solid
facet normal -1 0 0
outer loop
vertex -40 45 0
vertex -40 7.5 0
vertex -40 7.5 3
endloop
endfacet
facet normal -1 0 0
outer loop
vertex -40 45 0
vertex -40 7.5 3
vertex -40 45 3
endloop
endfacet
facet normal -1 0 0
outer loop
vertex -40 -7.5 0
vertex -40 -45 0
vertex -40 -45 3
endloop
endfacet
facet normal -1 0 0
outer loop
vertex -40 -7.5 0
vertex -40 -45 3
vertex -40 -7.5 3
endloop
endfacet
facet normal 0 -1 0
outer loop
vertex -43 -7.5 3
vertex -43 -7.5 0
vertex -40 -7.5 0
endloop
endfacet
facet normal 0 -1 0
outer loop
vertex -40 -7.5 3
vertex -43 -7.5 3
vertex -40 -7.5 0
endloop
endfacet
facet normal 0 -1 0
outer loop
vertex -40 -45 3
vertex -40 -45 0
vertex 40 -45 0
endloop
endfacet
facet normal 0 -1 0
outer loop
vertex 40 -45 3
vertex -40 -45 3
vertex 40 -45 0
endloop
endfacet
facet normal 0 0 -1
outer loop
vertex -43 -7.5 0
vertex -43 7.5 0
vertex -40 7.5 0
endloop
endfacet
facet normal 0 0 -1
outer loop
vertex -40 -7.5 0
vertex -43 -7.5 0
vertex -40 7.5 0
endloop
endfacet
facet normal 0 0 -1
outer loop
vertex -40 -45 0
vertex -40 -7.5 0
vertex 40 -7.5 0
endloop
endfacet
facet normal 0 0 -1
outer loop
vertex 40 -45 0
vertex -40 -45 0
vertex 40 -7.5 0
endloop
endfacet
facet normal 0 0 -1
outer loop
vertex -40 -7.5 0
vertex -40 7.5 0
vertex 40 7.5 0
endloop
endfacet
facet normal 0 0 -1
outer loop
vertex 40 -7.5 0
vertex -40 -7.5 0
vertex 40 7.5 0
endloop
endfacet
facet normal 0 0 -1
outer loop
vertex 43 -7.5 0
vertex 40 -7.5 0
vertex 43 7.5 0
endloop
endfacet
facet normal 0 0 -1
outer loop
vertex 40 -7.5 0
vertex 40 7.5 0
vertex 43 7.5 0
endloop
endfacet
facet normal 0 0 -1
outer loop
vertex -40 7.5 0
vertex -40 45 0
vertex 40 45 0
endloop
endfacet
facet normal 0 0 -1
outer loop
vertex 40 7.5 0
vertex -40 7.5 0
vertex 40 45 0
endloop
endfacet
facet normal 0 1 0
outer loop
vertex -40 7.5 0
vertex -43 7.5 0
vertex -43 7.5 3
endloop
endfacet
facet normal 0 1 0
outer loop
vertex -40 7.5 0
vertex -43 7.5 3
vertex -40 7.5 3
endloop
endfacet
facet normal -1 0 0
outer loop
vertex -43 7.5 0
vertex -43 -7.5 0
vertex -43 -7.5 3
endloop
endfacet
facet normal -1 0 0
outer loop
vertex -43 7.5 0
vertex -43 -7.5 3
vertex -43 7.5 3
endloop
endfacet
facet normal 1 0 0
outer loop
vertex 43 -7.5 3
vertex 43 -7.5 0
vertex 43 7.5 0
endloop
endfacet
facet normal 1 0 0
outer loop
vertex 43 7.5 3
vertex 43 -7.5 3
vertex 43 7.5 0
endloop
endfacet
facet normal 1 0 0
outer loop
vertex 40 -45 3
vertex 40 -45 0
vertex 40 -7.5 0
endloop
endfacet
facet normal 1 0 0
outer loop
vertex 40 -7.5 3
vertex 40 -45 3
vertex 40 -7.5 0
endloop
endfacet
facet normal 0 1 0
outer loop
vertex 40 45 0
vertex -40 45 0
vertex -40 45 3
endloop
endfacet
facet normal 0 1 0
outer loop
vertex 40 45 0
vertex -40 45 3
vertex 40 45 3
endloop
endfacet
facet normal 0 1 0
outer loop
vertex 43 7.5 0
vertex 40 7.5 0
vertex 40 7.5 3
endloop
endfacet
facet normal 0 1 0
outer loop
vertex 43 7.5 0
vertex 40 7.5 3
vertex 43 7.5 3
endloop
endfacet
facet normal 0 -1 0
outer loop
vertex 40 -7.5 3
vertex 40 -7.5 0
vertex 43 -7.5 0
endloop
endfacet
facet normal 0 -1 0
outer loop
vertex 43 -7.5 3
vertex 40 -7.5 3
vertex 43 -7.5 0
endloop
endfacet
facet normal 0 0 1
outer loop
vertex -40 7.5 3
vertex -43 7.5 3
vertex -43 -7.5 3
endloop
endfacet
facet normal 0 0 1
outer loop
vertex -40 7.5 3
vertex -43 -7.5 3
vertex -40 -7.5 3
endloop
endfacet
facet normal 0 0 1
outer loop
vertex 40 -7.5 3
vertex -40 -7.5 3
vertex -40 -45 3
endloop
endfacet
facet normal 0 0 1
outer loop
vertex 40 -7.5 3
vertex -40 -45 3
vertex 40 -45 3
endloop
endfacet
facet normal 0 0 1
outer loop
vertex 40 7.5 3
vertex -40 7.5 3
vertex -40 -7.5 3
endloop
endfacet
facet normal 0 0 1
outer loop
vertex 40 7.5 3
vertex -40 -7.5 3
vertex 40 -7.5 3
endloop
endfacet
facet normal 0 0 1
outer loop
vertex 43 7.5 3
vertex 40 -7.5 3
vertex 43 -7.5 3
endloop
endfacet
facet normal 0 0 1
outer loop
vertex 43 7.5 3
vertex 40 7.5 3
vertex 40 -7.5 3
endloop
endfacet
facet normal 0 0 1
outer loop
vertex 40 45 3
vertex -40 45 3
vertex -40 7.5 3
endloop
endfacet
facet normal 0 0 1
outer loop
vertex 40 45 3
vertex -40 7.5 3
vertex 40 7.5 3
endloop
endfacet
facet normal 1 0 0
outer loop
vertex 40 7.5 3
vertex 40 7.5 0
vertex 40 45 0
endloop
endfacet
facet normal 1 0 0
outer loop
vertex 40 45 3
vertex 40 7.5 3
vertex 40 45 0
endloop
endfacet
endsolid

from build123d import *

# Parameters (mm, degrees)
SKETCH1_W           = 3
SKETCH1_H           = 15
SKETCH1_W_2         = 80
SKETCH1_H_2         = 90
BOSS_EXTRUDE1_DEPTH = 3


with BuildPart() as part:
    # Sketch1 → Boss-Extrude1 (new body)
    with BuildSketch(Plane.XY):
        with Locations((-41.5, 0)):
            Rectangle(SKETCH1_W, SKETCH1_H)
        Rectangle(SKETCH1_W_2, SKETCH1_H_2)
        with Locations((41.5, 0)):
            Rectangle(SKETCH1_W, SKETCH1_H)
    extrude(amount=BOSS_EXTRUDE1_DEPTH)


solid = part.part
